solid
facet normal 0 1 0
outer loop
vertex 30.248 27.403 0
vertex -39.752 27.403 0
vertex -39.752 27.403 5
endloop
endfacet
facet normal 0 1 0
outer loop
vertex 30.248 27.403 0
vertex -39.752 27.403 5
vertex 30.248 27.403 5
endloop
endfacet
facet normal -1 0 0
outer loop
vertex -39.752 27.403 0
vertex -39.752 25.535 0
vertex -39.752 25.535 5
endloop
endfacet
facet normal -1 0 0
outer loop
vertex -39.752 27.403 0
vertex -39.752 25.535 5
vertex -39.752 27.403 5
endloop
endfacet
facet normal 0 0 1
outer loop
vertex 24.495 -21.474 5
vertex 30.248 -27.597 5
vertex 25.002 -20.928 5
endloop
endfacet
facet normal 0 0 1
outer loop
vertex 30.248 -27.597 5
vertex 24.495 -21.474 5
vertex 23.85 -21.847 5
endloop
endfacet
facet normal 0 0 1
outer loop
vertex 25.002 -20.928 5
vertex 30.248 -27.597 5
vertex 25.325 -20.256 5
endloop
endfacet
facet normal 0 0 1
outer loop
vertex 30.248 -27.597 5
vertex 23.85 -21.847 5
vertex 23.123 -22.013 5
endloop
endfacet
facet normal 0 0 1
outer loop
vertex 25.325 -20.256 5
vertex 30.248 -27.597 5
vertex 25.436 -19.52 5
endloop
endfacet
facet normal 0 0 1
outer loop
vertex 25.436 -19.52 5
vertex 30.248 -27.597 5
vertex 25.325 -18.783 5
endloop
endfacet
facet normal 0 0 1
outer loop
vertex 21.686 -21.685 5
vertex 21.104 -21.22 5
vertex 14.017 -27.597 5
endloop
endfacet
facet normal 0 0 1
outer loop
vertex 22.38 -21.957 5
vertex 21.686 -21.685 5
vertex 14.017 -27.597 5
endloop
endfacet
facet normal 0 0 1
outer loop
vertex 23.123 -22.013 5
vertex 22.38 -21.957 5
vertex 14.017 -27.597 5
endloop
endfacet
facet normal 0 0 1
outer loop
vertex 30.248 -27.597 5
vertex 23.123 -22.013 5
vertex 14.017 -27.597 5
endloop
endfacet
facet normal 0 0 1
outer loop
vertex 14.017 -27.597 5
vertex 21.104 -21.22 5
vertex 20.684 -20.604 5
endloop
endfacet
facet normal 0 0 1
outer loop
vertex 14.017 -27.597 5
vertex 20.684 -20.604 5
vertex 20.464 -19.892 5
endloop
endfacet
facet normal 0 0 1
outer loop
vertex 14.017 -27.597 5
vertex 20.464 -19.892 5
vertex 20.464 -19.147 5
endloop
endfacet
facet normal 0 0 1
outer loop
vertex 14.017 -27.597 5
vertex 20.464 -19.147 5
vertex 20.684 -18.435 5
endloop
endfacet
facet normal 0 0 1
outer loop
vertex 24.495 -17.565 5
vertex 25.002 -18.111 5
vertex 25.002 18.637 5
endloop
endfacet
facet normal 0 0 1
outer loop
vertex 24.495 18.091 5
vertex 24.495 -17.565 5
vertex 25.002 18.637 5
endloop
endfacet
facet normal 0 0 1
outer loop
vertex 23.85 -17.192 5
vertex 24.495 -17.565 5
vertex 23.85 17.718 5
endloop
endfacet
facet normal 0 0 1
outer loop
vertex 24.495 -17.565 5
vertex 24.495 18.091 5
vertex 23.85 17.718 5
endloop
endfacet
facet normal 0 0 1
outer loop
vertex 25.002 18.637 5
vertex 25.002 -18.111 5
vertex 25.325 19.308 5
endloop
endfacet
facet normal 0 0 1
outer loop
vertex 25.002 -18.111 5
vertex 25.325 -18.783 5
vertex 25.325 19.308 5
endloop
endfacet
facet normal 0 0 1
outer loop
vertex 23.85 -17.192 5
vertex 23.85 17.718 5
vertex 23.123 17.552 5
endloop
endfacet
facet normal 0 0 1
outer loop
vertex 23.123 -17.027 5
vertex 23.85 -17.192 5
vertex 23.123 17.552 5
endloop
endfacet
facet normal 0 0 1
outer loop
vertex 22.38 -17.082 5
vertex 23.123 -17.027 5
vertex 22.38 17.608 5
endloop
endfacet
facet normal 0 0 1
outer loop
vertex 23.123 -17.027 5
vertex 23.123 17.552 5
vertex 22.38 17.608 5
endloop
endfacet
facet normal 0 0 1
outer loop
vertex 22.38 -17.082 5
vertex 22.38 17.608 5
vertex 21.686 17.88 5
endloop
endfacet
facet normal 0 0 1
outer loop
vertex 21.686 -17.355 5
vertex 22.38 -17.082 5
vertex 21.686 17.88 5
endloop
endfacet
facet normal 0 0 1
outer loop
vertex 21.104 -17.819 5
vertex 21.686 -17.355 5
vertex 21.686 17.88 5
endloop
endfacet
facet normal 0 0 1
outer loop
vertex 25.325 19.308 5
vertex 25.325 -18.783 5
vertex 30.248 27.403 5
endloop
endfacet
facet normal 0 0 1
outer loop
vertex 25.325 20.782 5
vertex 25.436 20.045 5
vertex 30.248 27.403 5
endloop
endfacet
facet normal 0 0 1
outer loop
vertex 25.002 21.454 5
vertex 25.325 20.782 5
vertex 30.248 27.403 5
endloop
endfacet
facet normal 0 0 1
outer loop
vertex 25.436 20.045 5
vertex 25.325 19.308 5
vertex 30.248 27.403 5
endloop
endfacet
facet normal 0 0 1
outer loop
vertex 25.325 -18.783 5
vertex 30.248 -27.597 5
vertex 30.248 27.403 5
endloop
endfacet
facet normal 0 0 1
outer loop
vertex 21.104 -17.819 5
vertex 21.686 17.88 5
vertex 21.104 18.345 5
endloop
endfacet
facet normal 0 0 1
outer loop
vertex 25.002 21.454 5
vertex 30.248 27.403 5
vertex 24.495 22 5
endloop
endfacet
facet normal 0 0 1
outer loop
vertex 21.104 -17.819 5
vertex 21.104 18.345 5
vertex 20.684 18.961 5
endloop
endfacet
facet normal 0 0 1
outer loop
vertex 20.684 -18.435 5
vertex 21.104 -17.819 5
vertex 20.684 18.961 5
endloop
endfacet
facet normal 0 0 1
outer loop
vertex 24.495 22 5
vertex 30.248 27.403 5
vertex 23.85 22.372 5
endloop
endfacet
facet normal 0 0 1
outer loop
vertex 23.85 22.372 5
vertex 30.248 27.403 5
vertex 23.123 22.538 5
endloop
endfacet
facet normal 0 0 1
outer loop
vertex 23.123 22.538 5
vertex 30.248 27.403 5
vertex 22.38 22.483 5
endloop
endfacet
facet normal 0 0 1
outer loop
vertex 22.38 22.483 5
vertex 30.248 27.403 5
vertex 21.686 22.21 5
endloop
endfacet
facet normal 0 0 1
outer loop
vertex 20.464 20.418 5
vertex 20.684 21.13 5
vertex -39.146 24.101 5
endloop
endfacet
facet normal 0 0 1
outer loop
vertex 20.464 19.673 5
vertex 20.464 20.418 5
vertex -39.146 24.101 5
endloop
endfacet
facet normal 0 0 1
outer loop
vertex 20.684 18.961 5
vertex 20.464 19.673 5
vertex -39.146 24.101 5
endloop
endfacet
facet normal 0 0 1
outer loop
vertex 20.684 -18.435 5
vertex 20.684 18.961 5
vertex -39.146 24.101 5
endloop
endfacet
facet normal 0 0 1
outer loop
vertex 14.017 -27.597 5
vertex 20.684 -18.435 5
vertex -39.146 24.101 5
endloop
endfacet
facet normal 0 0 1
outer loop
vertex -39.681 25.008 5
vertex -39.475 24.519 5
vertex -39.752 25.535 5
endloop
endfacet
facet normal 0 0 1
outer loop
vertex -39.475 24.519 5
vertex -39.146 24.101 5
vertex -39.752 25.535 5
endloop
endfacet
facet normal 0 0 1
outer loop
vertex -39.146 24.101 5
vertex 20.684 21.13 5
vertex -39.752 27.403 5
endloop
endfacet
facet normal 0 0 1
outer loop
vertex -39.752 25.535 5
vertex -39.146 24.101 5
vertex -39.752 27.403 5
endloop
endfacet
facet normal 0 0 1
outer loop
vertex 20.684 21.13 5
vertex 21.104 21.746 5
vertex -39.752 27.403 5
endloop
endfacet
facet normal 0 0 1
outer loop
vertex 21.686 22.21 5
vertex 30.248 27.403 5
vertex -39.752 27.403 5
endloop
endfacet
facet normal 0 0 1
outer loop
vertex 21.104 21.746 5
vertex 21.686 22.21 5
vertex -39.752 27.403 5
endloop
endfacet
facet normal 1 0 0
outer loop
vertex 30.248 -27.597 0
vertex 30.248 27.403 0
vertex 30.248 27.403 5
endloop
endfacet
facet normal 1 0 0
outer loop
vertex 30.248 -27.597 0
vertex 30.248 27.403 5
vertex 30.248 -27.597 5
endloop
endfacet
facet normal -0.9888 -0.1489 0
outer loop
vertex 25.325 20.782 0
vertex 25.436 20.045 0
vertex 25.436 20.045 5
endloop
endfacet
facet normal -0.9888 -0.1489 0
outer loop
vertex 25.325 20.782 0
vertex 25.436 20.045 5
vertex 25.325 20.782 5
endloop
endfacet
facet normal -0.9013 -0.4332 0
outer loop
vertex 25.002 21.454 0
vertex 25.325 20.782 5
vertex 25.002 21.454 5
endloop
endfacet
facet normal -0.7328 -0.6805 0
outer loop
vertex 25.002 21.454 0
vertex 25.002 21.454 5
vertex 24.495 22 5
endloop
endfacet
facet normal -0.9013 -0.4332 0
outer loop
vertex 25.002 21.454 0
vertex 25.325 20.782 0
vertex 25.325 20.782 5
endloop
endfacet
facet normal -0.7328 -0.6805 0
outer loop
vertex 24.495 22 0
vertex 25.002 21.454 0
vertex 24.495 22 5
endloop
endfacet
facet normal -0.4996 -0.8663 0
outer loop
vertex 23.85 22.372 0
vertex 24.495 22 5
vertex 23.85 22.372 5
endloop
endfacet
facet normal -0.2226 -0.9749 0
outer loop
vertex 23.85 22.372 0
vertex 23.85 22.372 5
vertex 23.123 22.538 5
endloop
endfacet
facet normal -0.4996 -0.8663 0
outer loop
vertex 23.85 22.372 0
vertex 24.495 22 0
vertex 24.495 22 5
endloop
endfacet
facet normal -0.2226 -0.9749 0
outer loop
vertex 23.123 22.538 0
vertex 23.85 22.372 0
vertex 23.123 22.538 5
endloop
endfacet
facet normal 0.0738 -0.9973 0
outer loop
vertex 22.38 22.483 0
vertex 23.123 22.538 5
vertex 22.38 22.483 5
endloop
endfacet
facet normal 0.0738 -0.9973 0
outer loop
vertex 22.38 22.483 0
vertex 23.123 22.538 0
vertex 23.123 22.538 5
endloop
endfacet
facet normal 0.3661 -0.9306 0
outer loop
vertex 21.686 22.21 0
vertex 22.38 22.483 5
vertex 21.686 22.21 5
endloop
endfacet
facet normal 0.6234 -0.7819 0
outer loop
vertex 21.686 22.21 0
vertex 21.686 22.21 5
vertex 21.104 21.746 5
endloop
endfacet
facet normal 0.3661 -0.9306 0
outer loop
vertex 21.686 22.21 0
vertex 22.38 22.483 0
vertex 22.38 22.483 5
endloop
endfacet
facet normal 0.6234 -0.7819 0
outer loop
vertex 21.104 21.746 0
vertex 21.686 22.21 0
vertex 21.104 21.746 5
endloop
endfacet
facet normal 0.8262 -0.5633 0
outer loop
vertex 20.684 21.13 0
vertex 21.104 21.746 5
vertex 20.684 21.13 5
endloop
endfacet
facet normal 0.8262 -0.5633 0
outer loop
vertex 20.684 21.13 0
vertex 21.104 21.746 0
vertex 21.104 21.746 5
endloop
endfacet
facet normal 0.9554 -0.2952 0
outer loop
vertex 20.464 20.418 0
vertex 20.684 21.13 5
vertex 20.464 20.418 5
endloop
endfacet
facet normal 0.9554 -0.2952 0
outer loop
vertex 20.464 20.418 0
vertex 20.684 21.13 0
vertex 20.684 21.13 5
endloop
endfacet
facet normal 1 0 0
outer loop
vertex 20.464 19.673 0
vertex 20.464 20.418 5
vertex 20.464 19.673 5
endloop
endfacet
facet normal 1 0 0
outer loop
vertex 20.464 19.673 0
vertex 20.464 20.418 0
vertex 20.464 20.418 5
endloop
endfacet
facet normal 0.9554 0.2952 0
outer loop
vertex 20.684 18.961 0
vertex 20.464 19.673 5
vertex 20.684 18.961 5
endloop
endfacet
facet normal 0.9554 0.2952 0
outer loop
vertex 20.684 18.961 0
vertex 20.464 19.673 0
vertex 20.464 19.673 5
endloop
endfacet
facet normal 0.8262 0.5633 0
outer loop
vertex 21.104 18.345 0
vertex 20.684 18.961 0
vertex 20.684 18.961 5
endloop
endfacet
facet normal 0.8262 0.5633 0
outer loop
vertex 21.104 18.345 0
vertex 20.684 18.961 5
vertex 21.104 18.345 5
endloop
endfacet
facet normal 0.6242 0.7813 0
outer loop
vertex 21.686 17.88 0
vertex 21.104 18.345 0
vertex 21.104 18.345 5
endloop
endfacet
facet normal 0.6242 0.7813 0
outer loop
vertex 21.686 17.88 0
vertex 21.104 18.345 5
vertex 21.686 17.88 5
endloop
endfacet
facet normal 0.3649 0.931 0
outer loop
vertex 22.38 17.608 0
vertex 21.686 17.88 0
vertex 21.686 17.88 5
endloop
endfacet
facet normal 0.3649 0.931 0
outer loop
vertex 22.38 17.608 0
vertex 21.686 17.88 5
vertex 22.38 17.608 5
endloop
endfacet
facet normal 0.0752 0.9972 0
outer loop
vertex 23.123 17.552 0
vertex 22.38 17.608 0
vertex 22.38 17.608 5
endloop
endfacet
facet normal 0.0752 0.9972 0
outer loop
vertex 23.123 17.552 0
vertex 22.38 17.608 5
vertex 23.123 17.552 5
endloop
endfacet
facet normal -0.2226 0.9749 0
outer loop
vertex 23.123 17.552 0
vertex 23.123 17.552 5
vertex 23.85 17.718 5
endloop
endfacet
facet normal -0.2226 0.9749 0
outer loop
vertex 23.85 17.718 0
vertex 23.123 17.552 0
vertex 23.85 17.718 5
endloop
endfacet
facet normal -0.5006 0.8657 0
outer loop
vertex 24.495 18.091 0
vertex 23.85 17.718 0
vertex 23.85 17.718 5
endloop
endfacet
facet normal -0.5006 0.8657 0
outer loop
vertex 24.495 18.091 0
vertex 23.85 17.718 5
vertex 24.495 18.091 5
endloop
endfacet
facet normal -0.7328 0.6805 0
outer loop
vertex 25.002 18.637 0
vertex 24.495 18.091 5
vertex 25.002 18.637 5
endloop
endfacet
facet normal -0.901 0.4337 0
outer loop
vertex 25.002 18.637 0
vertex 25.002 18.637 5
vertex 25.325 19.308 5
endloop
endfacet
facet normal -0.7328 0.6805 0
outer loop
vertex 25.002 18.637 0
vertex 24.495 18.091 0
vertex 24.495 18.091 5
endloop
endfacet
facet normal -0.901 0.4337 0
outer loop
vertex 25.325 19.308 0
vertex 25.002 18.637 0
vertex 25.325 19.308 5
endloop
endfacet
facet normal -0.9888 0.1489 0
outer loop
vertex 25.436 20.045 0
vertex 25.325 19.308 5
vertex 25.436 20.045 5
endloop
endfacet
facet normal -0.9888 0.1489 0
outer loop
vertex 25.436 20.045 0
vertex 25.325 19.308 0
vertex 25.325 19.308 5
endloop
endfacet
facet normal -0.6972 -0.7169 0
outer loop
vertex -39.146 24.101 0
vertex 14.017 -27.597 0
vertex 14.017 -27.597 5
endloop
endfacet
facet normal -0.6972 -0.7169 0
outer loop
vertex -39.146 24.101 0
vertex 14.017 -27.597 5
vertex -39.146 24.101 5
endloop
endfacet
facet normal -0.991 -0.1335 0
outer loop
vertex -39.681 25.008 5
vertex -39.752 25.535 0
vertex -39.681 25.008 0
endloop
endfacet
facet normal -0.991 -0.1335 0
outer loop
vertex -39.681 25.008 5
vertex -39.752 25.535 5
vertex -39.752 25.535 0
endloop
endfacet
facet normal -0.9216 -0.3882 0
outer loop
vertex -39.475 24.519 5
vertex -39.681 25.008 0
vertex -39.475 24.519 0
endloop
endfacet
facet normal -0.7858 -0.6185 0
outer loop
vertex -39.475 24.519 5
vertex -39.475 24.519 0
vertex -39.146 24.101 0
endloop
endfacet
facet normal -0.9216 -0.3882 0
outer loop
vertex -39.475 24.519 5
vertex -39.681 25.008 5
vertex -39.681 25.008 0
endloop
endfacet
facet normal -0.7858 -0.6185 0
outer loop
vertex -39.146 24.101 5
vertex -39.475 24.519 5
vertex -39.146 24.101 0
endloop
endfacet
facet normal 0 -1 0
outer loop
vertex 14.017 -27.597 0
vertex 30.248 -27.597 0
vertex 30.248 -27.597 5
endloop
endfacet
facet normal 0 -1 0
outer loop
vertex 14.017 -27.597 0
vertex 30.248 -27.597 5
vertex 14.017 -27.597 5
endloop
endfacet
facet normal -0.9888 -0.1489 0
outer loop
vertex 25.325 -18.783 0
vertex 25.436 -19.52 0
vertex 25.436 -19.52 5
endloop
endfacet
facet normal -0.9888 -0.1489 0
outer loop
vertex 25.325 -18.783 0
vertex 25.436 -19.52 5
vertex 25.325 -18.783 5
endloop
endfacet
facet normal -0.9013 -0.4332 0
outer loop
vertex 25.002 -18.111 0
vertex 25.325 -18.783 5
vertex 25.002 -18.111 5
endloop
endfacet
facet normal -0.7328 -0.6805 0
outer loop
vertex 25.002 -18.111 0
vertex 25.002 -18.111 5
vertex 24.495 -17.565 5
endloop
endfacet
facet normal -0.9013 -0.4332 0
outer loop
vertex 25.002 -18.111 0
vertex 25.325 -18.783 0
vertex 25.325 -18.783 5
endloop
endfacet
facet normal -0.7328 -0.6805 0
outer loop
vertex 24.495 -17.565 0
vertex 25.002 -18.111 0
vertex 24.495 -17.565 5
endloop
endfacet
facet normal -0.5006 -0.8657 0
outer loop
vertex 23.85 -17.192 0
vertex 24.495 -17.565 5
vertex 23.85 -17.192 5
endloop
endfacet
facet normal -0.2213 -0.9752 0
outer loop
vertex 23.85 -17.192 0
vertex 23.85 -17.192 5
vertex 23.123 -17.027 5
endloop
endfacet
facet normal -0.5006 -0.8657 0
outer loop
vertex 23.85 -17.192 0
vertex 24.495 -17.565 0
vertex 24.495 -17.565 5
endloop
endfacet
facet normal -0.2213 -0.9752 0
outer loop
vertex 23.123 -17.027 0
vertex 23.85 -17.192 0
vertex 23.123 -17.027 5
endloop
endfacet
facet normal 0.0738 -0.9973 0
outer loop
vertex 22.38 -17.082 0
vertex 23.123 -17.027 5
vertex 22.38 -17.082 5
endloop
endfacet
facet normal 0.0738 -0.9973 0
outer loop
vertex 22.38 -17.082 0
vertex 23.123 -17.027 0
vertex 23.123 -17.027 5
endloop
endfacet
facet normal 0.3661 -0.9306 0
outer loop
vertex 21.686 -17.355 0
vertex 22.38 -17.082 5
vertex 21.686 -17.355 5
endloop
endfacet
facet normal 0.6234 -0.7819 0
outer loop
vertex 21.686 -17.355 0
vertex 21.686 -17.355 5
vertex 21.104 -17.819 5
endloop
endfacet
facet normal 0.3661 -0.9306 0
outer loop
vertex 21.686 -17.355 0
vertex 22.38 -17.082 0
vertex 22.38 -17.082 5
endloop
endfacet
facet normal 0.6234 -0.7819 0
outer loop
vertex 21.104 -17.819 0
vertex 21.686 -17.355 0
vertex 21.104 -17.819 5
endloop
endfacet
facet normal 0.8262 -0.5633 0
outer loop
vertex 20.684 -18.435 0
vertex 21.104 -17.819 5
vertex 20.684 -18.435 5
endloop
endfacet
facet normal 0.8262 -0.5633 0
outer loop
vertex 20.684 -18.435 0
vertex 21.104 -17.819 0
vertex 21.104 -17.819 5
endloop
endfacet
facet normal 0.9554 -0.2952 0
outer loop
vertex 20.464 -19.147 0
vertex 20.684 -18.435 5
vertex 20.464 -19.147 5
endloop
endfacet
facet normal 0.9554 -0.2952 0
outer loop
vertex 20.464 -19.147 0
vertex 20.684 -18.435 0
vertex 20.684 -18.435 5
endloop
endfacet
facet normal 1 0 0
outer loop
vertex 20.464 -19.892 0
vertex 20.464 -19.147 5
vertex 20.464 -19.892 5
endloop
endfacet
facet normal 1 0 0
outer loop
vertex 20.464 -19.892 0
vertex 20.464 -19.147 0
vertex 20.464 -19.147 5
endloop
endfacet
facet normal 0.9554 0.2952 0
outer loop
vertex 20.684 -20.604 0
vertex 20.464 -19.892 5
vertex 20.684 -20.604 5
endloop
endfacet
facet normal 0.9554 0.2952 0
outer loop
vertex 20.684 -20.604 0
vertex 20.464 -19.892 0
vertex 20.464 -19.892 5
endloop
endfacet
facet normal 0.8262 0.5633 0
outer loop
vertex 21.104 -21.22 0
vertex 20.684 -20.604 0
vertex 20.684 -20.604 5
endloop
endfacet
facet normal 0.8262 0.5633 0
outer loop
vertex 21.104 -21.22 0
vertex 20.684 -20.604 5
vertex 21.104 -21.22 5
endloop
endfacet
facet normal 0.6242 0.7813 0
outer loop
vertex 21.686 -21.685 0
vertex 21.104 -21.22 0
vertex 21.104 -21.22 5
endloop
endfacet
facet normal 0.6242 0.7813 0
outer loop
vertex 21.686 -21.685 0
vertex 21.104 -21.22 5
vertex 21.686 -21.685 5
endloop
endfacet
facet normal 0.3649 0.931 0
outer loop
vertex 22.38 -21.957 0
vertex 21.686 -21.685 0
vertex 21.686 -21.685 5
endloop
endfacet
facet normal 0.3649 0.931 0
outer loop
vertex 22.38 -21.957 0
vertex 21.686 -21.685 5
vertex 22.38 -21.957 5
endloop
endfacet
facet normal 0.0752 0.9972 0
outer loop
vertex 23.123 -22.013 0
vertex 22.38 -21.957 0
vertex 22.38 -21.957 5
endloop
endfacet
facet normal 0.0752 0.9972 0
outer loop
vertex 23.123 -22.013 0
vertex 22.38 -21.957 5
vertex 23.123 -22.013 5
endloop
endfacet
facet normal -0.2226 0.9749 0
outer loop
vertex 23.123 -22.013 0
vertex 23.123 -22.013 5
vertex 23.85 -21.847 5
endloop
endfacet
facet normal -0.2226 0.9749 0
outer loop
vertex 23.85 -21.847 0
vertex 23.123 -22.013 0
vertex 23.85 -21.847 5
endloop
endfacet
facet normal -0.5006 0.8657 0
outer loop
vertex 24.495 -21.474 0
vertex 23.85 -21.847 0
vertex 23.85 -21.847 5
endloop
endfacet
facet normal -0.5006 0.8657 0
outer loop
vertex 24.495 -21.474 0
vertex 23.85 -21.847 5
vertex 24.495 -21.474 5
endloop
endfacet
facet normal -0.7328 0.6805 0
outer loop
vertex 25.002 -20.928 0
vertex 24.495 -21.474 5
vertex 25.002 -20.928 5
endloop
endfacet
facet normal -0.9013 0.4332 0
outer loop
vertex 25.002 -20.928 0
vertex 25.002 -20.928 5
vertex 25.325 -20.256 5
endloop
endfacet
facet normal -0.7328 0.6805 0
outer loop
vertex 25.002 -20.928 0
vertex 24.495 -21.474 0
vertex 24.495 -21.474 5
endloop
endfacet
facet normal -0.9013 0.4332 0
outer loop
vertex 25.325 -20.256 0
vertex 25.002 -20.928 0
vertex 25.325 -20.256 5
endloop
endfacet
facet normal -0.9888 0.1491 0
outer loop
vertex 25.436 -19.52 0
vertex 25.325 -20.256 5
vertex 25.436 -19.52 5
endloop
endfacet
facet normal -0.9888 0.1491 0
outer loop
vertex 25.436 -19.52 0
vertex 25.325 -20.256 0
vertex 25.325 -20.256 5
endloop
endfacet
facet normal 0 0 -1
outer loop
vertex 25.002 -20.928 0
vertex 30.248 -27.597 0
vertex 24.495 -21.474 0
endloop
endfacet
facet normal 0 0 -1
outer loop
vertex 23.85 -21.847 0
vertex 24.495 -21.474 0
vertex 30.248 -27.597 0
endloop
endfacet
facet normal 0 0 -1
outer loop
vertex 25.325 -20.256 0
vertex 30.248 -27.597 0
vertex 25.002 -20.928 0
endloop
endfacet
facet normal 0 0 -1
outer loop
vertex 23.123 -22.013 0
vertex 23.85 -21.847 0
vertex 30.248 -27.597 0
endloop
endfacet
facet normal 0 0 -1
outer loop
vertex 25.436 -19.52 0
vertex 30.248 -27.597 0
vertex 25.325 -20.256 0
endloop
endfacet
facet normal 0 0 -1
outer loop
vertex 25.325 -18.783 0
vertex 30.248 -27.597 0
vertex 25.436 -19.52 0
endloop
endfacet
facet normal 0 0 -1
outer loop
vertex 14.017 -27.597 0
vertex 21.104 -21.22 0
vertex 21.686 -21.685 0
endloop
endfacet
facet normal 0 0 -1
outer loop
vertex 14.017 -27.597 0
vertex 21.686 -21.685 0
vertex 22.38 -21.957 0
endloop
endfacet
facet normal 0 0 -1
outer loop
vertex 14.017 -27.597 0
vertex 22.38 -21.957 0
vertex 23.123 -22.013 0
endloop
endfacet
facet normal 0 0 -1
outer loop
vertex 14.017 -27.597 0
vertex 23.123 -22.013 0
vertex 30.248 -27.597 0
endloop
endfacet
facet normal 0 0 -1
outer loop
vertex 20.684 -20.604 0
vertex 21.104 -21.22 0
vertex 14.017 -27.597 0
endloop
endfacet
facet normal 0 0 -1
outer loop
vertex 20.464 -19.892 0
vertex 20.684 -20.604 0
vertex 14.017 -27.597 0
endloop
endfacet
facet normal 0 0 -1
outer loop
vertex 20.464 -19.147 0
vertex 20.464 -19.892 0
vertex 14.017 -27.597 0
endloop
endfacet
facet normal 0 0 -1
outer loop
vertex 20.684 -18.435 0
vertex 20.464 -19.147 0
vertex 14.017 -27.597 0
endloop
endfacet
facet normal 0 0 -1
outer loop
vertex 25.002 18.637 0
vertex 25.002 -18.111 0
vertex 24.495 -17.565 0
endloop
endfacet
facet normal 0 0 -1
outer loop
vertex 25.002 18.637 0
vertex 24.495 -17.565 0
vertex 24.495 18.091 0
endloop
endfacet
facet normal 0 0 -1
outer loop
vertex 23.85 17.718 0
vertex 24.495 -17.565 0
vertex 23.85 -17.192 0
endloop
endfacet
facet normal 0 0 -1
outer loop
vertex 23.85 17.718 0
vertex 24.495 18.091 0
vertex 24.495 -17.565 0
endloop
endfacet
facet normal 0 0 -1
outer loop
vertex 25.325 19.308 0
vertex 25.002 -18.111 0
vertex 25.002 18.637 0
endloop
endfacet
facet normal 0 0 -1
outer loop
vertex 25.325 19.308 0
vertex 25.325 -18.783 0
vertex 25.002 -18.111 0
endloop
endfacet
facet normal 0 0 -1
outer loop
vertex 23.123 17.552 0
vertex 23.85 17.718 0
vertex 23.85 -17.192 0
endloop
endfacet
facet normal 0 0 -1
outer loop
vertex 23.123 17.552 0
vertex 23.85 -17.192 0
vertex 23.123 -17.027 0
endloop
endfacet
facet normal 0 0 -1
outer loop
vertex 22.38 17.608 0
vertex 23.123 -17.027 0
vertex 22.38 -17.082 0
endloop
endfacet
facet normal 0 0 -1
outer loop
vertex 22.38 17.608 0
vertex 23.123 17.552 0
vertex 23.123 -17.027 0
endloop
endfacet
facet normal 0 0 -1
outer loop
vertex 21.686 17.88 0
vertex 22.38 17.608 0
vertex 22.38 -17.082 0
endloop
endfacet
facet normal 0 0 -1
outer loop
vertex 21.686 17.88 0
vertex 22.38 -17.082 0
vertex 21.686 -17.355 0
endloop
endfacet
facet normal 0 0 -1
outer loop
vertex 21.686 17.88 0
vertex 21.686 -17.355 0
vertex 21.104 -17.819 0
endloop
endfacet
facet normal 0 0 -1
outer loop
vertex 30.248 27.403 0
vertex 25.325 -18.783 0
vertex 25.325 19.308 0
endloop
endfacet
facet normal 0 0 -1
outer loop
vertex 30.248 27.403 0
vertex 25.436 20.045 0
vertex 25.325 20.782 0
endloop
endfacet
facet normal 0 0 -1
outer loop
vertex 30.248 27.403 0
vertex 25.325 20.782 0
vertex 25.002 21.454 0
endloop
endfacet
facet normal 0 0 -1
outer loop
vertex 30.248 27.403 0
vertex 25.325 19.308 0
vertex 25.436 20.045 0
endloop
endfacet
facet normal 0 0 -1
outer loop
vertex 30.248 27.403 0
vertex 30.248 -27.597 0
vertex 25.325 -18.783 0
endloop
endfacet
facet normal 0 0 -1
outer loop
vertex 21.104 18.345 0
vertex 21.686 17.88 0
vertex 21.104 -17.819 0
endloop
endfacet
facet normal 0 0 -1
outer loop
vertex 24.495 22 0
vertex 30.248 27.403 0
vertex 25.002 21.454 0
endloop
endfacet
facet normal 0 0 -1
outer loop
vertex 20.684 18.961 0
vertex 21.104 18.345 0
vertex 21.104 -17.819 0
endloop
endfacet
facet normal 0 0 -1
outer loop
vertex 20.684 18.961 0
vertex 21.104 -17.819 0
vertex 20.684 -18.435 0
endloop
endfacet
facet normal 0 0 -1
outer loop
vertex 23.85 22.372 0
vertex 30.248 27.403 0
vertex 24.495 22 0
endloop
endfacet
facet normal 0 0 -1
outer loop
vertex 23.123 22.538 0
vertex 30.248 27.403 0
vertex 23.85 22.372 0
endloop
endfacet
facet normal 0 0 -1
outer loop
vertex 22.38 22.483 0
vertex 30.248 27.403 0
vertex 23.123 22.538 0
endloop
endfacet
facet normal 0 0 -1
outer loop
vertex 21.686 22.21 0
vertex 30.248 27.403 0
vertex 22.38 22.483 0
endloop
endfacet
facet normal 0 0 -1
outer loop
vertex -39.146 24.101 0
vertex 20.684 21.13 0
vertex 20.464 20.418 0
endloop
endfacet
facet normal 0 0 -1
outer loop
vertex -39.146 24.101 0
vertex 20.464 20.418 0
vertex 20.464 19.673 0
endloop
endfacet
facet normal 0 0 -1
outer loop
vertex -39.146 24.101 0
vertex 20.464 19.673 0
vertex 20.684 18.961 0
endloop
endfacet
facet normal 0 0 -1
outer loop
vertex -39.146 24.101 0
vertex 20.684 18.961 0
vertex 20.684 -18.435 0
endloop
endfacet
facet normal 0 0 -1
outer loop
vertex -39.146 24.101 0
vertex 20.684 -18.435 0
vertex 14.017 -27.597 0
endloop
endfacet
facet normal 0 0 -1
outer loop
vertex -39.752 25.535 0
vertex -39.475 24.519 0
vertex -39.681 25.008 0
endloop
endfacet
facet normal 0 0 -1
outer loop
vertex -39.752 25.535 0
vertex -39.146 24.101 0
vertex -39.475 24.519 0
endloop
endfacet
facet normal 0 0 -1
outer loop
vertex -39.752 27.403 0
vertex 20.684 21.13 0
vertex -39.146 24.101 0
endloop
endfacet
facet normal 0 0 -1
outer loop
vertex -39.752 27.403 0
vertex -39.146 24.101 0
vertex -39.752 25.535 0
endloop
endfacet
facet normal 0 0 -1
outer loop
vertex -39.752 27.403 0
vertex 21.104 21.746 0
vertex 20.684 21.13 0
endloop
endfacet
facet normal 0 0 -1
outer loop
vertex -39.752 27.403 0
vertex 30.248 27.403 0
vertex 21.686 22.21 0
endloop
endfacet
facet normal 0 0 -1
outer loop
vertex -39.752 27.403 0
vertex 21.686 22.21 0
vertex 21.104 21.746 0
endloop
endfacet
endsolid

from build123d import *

# Parameters (mm, degrees)
ESQUISSE1_R        = 2.5
BOSS_EXTRU_2_DEPTH = 5
CONG_2_R           = 2


with BuildPart() as part:
    # Esquisse1 → Boss.-Extru.2 (new body)
    with BuildSketch(Plane.XY):
        Polygon((-39.751873238, 27.403100775), (30.248126762, 27.403100775), (30.248126762, -27.596899225), (14.016967887, -27.596899225), (-39.751873238, 24.689922481), align=None)
        with Locations((22.936263184, 20.04525616)):
            Circle(ESQUISSE1_R, mode=Mode.SUBTRACT)
        with Locations((22.936263184, -19.519610844)):
            Circle(ESQUISSE1_R, mode=Mode.SUBTRACT)
    extrude(amount=BOSS_EXTRU_2_DEPTH)

    # Congé2
    cong_2_edges = [part.edges().sort_by_distance(p)[0] for p in [
        (-39.751873238, 24.689922481, 2.5),
    ]]
    fillet(cong_2_edges, radius=CONG_2_R)


solid = part.part
